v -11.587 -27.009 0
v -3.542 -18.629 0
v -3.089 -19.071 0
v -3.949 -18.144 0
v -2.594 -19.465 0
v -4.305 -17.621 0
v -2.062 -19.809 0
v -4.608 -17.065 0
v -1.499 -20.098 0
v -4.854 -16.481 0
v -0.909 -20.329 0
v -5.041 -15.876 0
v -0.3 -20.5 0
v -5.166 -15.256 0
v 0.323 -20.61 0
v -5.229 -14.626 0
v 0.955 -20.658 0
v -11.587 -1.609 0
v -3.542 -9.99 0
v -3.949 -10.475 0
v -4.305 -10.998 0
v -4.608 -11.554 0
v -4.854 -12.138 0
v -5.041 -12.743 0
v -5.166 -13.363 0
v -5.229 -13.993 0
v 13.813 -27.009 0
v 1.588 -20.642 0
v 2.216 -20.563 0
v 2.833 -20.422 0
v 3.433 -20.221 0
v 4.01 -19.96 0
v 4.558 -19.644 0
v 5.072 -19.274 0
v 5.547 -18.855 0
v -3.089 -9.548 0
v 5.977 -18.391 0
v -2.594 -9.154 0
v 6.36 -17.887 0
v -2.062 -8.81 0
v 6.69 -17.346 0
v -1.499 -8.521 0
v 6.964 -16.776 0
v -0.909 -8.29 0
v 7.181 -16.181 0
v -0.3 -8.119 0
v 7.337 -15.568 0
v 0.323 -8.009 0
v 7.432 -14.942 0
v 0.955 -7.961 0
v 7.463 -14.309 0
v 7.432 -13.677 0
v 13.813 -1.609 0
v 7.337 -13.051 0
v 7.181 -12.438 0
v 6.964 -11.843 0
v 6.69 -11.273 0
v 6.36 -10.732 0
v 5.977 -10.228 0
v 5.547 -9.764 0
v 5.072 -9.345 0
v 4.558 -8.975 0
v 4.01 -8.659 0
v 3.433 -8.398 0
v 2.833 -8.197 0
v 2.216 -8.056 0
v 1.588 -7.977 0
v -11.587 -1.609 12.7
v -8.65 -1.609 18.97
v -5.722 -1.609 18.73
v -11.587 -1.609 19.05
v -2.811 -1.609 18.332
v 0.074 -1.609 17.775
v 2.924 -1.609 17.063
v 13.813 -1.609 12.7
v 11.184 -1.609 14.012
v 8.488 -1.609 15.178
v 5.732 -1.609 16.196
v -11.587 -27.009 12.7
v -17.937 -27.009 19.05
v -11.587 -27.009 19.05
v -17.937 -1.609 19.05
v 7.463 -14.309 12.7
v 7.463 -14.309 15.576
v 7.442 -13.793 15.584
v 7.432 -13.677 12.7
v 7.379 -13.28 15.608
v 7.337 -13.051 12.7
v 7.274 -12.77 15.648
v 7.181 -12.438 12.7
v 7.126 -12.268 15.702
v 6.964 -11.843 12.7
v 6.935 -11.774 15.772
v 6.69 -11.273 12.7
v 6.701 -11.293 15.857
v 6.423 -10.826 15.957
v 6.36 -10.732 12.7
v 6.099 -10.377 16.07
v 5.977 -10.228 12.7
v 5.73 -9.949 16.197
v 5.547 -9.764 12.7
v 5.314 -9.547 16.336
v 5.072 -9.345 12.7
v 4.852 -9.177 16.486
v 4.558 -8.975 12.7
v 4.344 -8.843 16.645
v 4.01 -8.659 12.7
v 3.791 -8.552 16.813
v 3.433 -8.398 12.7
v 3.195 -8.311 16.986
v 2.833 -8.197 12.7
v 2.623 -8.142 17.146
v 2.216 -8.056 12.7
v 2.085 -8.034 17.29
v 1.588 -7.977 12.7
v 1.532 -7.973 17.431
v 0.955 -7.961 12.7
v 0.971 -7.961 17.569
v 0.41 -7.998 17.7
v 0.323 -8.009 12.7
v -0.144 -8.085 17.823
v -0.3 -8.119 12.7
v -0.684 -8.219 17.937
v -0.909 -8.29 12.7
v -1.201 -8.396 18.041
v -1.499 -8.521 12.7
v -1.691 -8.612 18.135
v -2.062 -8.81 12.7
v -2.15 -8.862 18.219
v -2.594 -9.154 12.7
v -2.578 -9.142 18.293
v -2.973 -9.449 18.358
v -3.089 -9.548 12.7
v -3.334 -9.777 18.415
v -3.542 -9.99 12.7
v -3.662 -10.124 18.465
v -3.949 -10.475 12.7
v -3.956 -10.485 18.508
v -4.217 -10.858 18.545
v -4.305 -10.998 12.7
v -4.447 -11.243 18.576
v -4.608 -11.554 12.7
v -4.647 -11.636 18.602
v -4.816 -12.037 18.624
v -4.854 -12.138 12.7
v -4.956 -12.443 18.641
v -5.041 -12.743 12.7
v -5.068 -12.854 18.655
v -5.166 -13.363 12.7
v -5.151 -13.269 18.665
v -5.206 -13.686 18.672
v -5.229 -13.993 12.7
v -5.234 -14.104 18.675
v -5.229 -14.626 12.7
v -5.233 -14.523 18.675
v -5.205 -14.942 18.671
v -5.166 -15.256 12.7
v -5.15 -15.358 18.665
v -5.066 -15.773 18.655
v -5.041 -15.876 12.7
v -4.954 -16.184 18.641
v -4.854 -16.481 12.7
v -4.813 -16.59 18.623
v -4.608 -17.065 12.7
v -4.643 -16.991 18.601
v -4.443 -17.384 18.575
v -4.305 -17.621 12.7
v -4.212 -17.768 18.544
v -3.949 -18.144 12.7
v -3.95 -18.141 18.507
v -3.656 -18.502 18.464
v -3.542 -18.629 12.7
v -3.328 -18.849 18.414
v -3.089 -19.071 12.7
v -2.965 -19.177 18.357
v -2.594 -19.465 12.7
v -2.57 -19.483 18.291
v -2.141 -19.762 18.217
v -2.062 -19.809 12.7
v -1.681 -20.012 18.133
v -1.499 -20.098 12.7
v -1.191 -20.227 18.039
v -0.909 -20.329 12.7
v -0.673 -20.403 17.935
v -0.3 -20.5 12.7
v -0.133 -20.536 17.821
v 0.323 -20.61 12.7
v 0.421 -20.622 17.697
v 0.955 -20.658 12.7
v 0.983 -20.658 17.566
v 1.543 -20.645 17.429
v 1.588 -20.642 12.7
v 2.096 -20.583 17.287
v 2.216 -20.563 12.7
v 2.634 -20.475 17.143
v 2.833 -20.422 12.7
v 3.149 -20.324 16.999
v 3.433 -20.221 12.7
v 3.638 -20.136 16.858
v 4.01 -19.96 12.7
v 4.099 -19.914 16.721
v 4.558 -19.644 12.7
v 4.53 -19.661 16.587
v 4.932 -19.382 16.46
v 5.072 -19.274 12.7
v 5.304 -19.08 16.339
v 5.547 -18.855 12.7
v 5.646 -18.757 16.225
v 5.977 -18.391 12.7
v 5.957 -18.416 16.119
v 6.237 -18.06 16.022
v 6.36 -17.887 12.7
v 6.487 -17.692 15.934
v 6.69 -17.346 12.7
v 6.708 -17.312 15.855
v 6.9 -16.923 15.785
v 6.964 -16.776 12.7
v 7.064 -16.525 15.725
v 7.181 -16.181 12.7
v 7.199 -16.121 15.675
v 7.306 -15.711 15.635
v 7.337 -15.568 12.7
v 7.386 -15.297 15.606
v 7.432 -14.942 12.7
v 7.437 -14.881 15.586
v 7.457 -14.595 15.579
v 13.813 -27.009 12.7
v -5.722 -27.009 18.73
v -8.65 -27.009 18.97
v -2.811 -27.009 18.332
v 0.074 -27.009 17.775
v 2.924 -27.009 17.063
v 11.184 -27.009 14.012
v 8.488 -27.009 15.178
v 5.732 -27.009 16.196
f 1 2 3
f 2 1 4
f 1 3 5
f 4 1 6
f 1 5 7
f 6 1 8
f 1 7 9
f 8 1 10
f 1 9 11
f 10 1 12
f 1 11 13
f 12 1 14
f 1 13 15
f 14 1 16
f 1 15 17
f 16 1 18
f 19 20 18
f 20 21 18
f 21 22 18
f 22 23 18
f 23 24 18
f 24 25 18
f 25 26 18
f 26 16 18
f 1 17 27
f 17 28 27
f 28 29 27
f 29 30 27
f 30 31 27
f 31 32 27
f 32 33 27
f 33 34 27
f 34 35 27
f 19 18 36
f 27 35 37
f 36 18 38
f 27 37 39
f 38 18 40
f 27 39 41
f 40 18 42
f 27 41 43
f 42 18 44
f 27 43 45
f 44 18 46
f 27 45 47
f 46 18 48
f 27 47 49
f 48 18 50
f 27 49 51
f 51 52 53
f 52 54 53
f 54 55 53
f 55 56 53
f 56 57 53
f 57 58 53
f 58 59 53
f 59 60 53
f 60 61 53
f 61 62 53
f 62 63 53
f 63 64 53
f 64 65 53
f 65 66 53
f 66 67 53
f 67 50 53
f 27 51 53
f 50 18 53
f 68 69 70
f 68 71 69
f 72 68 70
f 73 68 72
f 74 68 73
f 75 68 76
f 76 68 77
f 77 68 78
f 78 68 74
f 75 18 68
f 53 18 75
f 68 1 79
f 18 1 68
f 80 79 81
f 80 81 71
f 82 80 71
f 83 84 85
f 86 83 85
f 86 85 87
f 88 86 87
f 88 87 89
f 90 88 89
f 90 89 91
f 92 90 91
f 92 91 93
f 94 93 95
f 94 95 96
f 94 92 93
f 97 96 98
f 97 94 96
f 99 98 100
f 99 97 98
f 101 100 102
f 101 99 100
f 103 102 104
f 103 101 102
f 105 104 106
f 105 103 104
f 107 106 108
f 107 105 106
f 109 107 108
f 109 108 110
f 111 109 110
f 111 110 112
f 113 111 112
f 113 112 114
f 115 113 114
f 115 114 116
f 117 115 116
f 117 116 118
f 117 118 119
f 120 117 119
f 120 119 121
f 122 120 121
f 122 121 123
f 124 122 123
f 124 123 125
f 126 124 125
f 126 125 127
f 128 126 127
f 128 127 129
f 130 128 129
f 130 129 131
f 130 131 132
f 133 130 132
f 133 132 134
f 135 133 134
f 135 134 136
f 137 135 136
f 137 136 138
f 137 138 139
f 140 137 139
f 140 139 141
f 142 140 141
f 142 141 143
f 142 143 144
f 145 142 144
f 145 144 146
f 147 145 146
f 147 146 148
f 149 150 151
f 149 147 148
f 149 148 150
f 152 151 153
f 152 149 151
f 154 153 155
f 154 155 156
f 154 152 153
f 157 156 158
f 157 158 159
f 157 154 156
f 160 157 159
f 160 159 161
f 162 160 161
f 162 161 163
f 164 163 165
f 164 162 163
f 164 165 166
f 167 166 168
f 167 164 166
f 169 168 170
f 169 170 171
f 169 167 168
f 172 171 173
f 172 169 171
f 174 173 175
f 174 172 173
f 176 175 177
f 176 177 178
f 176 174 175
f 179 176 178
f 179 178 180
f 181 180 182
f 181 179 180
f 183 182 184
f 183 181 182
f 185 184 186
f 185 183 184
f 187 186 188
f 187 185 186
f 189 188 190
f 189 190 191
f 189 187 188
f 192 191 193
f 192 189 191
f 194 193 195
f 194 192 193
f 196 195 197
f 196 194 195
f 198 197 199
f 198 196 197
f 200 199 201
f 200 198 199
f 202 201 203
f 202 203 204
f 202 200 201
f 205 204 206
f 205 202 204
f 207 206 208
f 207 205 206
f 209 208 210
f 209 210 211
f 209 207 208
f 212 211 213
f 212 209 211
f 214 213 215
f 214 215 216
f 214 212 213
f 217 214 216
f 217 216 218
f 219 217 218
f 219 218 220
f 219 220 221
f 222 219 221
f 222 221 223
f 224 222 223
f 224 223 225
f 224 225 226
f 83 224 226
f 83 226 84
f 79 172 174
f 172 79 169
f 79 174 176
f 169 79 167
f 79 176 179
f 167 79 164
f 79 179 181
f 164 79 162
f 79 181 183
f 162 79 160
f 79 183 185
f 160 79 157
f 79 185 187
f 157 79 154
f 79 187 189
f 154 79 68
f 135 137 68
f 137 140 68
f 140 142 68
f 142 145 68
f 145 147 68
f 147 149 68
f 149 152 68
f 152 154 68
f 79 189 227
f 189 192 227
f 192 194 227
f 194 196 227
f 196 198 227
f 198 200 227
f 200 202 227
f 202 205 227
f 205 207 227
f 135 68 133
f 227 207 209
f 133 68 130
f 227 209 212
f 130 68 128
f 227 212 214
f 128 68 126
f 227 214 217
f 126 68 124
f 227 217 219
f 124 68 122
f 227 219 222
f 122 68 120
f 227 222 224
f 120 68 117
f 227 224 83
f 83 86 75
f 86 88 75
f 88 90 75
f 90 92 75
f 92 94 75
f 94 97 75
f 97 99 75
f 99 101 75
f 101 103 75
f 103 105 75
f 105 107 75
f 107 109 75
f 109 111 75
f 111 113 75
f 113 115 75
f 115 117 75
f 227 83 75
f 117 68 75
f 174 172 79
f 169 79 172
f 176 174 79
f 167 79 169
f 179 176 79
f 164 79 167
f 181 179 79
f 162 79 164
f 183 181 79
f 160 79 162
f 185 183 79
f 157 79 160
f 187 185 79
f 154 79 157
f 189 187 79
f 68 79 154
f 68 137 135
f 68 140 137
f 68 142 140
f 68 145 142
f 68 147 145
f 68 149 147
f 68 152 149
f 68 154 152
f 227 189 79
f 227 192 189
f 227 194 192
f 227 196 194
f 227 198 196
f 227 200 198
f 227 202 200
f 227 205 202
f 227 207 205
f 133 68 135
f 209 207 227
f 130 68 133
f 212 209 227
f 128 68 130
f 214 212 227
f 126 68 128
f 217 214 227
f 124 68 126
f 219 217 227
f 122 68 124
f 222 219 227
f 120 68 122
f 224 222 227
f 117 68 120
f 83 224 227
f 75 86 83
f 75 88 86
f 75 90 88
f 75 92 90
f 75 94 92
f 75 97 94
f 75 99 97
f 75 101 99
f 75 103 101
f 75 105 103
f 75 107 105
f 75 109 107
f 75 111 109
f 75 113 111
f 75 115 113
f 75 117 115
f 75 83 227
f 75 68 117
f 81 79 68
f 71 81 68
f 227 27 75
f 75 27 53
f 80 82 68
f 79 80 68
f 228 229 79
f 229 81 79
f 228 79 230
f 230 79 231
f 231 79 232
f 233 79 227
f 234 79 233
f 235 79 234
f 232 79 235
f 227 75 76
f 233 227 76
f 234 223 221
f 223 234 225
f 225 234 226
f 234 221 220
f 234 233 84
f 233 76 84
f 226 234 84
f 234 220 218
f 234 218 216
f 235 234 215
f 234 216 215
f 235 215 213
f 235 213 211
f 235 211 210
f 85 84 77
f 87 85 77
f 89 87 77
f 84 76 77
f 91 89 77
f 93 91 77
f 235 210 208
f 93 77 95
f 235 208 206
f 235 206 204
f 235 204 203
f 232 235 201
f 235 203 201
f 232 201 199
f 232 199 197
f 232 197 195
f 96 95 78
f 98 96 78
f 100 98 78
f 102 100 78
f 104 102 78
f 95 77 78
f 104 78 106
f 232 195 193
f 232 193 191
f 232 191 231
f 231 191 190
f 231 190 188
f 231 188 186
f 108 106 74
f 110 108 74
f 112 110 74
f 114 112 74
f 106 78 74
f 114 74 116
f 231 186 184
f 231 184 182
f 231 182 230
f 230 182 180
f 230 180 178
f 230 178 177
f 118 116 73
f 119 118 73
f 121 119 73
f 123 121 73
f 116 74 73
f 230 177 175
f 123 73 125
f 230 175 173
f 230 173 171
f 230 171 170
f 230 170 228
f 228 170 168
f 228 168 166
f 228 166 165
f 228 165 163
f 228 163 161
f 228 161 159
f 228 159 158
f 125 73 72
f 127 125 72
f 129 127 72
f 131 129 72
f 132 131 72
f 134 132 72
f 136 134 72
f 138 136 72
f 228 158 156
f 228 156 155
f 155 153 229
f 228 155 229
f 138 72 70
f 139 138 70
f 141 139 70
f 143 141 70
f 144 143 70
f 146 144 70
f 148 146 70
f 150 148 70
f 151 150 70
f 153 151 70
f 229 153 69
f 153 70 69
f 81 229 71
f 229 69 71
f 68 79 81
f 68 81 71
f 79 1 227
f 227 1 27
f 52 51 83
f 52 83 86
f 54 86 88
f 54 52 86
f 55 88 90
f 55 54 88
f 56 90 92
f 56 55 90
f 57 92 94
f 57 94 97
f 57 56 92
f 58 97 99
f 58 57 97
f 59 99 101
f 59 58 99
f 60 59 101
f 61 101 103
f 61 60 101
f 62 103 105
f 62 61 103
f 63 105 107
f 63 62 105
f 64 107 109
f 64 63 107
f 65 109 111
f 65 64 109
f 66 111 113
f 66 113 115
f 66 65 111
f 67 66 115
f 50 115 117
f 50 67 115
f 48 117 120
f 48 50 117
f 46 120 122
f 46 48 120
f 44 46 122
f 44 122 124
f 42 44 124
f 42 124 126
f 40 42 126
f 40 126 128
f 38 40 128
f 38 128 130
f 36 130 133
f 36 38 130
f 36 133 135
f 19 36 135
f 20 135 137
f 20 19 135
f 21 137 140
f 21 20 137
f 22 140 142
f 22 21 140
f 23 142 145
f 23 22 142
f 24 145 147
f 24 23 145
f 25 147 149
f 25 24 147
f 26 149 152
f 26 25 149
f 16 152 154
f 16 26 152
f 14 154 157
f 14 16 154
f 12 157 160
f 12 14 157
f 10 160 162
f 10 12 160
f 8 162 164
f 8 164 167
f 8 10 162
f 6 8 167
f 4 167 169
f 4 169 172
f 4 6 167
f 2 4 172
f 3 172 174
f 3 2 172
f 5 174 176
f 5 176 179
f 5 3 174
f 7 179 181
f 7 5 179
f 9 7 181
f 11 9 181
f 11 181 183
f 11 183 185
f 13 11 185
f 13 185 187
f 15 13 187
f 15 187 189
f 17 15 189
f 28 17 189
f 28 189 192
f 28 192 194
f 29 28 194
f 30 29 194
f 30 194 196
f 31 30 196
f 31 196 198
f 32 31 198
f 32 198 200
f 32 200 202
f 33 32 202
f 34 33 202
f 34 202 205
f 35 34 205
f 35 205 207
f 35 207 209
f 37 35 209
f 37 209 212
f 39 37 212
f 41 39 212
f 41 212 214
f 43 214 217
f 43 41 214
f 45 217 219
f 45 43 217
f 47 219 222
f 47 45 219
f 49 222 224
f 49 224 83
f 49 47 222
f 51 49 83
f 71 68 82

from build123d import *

# Parameters (mm, degrees)
F0_W     = 25.4
F0_H     = 25.4
F0_R     = 6.35
F1_DEPTH = 12.7
F2_DEPTH = 6.35
F3_DEPTH = 6.35
F5_DEPTH = 25.4
F7_DEPTH = 25.4


with BuildPart() as f1:
    # F0 (on Top) → F1 (new body)
    with BuildSketch(Plane.XY):
        with Locations((1.1130588174, -14.3094803207)):
            Rectangle(F0_W, F0_H)
        with Locations((1.1130588174, -14.3094803207)):
            Circle(F0_R, mode=Mode.SUBTRACT)
    extrude(amount=F1_DEPTH)


with BuildPart() as f2:
    # F2 (new): a face of the model
    f2_faces = [f1.part.faces().sort_by_distance(p)[0] for p in [
        (1.1130588174, -1.9686905655, 12.7),
    ]]
    extrude(f2_faces, amount=F2_DEPTH)


with BuildPart() as f3:
    # F3 (new): a face of the model
    f3_faces = [f2.part.faces().sort_by_distance(p)[0] for p in [
        (-11.5869411826, -14.3094803207, 15.875),
    ]]
    extrude(f3_faces, amount=F3_DEPTH)

    # F4 (on face) → F5 (cut)
    with BuildSketch(Plane(origin=(0, -1.6094803207, 0), x_dir=(-1, 0, 0), z_dir=(0, 1, 0))):
        Polygon((17.9369411826, 19.05), (11.5869411826, 12.7), (17.9369411826, 12.7), align=None)
    extrude(amount=-F5_DEPTH, mode=Mode.SUBTRACT)


with BuildPart() as f2_1:
    add(f2.part)

    # F6 (on face) → F7 (cut)
    with BuildSketch(Plane(origin=(0, -1.6094803207, 0), x_dir=(-1, 0, 0), z_dir=(0, 1, 0))):
        with BuildLine():
            ThreePointArc((-13.8130588174, 12.7), (-1.5039191787, 17.4384414453), (11.5869411826, 19.05))
            Line((11.5869411826, 19.05), (-13.8130588174, 19.05))
            Line((-13.8130588174, 19.05), (-13.8130588174, 12.7))
        make_face()
    extrude(amount=-F7_DEPTH, mode=Mode.SUBTRACT)


solid = Compound([f1.part, f3.part, f2_1.part])
